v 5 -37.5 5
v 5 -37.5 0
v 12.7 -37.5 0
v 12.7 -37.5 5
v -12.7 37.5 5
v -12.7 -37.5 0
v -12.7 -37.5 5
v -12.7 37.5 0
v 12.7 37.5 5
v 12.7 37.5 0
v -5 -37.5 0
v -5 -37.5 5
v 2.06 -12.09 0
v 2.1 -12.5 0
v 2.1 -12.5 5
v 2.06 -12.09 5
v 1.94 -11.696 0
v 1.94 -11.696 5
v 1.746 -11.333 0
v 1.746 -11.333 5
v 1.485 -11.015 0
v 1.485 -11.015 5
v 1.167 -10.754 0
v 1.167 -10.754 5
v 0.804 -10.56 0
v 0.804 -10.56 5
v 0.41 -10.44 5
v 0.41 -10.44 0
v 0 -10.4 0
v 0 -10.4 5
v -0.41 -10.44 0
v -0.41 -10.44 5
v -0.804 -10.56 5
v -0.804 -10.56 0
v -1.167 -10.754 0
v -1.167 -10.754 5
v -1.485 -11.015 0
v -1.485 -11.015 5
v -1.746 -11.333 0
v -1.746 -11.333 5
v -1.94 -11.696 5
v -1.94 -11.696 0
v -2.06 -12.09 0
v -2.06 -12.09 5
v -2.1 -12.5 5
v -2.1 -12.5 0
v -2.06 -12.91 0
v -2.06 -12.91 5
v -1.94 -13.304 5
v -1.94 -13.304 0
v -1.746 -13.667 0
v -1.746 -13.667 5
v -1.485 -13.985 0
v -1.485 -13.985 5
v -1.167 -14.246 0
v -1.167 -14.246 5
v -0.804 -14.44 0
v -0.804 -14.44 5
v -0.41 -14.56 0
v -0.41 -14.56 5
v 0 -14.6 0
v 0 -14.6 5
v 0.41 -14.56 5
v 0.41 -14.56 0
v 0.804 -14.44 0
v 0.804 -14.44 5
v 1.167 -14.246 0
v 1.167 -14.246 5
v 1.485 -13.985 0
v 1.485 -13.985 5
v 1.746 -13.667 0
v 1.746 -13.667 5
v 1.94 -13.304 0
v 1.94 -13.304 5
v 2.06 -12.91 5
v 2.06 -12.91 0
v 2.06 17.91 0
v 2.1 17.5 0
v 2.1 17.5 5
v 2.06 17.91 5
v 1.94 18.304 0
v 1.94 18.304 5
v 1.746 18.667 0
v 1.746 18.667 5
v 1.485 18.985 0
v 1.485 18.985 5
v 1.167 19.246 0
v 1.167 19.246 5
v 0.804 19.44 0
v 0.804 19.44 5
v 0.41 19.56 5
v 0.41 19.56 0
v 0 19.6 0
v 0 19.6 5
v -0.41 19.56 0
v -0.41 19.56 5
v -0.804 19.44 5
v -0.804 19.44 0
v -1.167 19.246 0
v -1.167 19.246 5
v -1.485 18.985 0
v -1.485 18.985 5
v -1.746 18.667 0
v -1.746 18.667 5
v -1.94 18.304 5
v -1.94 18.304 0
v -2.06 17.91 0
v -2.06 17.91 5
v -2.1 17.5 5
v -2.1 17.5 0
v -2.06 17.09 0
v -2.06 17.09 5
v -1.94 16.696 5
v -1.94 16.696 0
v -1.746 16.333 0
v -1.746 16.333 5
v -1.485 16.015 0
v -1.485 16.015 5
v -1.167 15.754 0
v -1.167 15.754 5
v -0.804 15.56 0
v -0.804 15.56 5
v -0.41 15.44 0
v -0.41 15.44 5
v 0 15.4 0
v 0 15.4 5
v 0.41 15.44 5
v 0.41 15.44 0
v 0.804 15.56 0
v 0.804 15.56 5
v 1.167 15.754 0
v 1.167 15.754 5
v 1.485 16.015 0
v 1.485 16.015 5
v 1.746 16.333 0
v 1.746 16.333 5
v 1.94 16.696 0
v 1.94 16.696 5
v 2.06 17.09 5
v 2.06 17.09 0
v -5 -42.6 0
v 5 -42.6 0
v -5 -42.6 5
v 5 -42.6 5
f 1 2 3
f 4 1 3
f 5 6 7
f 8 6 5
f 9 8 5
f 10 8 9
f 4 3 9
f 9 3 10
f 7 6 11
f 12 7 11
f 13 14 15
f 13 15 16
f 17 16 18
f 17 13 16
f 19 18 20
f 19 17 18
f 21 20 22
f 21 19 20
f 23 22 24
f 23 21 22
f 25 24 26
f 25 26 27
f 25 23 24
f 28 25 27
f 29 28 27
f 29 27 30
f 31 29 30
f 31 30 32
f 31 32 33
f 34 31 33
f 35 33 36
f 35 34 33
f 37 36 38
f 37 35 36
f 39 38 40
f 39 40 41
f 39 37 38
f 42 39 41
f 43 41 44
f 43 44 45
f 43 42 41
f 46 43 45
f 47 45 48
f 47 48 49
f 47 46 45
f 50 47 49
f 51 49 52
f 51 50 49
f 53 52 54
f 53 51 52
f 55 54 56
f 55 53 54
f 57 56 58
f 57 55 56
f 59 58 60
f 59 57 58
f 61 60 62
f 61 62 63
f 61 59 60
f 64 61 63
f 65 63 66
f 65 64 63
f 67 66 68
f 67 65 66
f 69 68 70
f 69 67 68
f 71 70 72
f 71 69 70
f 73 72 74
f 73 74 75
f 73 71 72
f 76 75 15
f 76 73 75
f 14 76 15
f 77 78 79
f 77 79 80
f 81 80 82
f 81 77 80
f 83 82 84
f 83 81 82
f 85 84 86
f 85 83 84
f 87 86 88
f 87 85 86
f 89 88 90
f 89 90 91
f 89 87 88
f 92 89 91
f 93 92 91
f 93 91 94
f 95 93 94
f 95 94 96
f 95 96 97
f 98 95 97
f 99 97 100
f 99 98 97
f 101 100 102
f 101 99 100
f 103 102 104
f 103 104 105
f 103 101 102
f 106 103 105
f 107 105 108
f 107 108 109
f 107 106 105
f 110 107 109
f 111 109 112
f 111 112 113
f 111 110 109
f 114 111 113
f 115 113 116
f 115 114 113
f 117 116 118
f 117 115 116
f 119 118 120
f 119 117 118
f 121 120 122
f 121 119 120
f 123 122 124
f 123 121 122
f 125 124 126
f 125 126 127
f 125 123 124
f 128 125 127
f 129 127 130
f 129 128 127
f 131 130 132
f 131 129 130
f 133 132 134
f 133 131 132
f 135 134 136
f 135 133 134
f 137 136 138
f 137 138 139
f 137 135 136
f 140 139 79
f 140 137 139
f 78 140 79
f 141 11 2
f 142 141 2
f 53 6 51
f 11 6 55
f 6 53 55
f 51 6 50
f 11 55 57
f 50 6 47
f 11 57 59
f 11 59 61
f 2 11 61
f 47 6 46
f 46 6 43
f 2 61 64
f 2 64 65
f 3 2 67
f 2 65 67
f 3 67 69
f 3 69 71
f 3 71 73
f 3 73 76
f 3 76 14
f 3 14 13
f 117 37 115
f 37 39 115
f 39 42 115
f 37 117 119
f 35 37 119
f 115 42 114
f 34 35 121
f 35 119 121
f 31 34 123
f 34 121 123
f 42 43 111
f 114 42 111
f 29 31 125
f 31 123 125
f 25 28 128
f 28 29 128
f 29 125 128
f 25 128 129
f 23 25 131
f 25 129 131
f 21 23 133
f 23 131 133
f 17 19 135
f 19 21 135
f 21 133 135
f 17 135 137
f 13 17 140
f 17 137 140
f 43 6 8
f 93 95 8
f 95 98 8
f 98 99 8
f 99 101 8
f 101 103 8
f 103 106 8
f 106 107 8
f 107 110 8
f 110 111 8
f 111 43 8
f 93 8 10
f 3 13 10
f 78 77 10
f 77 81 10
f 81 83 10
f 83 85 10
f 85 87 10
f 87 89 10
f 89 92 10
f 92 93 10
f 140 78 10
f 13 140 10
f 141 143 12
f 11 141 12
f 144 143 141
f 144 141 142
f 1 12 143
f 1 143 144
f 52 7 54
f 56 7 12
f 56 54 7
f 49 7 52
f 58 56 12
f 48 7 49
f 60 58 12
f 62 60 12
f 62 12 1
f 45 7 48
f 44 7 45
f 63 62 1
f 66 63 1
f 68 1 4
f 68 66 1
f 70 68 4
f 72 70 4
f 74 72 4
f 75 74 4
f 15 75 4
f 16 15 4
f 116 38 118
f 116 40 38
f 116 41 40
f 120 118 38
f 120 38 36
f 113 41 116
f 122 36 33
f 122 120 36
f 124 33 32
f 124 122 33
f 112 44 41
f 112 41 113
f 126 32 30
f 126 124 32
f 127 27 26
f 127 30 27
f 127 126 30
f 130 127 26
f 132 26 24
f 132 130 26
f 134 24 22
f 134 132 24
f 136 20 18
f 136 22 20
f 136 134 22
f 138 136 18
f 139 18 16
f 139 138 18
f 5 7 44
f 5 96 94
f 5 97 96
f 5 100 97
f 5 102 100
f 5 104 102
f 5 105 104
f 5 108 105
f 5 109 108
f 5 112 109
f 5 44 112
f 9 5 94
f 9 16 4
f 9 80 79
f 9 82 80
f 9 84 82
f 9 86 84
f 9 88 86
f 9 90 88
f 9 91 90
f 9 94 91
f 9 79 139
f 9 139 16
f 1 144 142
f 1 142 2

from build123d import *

# Parameters (mm, degrees)
SKETCH1_W           = 25.4
SKETCH1_H           = 75
SKETCH1_R           = 2.1
BOSS_EXTRUDE1_DEPTH = 5
SKETCH2_W           = 10
SKETCH2_H           = 10.2
BOSS_EXTRUDE2_DEPTH = 5


with BuildPart() as part:
    # Sketch1 → Boss-Extrude1 (new body)
    with BuildSketch(Plane.XY):
        Rectangle(SKETCH1_W, SKETCH1_H)
        with Locations((0, -12.5)):
            Circle(SKETCH1_R, mode=Mode.SUBTRACT)
        with Locations((0, 17.5)):
            Circle(SKETCH1_R, mode=Mode.SUBTRACT)
    extrude(amount=BOSS_EXTRUDE1_DEPTH)

    # Sketch2 → Boss-Extrude2 (add)
    with BuildSketch(Plane.XY.offset(5)):
        with Locations((0, -37.5)):
            Rectangle(SKETCH2_W, SKETCH2_H)
    extrude(amount=-BOSS_EXTRUDE2_DEPTH)


solid = part.part
